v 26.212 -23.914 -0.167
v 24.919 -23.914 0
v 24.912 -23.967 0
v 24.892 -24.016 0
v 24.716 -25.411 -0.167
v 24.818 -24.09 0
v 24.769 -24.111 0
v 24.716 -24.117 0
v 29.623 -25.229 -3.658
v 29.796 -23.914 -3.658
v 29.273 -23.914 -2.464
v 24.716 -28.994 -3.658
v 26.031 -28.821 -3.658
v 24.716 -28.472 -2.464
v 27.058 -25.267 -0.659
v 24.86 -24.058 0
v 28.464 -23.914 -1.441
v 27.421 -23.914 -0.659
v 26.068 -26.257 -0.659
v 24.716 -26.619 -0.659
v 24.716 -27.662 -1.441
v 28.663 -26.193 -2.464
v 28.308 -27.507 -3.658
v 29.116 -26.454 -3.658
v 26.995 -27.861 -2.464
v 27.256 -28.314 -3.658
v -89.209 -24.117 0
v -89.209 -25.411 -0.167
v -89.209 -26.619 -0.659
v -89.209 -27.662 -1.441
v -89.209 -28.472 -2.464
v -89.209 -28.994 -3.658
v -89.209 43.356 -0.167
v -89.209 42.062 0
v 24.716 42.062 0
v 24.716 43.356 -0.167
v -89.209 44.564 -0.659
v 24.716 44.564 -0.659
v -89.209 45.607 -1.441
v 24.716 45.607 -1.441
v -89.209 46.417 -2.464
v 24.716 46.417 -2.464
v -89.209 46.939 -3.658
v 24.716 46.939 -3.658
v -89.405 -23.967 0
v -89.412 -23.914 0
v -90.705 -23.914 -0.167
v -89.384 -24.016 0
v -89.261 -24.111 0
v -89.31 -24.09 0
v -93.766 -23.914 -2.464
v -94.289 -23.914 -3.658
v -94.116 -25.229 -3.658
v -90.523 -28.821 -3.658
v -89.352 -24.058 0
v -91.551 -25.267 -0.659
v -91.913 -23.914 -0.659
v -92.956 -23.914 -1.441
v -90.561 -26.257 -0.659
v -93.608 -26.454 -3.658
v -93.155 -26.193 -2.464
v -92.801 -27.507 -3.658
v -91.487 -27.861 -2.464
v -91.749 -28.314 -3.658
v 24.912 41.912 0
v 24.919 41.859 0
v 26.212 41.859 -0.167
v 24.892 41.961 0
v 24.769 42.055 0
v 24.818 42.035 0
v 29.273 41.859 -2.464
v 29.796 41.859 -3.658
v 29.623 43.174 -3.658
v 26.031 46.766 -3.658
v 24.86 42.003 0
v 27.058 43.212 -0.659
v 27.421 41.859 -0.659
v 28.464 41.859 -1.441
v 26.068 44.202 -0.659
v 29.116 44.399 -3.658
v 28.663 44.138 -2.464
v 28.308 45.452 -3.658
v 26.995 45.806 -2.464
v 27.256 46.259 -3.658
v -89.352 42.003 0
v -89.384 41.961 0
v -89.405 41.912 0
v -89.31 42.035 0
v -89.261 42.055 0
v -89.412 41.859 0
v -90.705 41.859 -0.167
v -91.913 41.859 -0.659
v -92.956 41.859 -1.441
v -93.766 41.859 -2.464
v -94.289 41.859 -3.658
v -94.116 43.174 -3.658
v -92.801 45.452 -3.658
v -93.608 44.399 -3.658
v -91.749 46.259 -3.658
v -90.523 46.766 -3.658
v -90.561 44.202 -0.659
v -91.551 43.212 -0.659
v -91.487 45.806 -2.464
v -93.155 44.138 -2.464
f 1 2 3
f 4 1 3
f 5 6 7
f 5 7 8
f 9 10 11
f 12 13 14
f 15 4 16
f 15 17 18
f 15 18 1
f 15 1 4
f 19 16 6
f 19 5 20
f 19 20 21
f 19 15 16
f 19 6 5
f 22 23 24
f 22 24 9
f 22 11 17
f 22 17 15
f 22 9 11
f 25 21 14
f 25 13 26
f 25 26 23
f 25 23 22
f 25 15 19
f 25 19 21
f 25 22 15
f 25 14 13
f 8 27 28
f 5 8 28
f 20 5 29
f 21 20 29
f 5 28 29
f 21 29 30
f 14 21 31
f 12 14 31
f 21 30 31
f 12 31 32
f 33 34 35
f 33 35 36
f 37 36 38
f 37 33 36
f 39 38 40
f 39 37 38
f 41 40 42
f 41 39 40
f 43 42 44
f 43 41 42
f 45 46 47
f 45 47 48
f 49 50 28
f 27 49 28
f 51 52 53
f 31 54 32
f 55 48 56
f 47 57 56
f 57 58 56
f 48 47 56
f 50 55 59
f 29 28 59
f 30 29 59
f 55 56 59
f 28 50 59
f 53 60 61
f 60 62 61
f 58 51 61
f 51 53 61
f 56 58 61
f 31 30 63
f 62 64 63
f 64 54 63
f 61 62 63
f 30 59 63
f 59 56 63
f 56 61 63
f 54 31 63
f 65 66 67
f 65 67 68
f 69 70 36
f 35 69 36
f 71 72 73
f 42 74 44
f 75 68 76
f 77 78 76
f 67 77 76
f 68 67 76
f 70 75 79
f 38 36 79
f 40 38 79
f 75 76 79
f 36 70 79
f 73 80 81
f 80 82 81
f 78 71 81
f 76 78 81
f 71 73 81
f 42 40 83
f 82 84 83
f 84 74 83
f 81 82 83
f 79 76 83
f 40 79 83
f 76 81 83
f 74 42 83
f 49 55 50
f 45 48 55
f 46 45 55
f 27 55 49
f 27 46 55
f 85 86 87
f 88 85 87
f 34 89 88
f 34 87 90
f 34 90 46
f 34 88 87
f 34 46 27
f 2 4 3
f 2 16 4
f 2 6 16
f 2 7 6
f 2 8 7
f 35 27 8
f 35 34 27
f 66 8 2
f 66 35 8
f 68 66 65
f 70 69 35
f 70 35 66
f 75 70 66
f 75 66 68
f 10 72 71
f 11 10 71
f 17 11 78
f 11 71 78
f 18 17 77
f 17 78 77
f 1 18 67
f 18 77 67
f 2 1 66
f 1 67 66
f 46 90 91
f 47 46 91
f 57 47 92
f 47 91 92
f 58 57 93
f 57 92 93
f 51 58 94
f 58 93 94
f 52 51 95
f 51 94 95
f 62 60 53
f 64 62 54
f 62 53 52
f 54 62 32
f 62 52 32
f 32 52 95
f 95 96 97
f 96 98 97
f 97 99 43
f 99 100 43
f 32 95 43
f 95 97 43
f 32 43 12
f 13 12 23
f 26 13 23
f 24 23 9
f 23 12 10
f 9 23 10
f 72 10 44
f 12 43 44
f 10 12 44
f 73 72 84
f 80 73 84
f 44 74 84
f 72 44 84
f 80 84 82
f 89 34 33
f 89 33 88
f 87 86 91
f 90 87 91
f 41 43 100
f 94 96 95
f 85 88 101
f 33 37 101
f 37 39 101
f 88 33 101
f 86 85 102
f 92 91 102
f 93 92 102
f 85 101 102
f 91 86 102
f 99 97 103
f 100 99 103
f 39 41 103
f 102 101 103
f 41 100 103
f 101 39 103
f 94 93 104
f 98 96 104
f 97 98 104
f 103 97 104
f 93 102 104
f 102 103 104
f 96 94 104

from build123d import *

# Parameters (mm, degrees)
F0_W         = 124.0848004818
F0_H         = 75.9339258075
F1_DEPTH     = 3.6583524197
F2_R         = 5.08
F3_T1_DEPTH  = 113.9248004818
F3_T3_DEPTH  = 65.7739258075
F3_T6_ANGLE  = 90
F3_T8_ANGLE  = 90
F3_T10_ANGLE = 90
F3_T12_ANGLE = 90


# Not quite as in the source:
# - a fillet or chamfer that OpenCascade refuses, or shapes differently, is made with other operations: its cross-section is extruded or revolved along the edge and cut away or added


with BuildPart() as f1:
    # F0 (on Top) → F1 (new body)
    with BuildSketch(Plane.XY):
        with Locations((-32.2462767363, 8.972465992)):
            Rectangle(F0_W, F0_H)
    extrude(amount=-F1_DEPTH)

    # F2
    f2_edges = [f1.edges().sort_by_distance(p)[0] for p in [
        (29.796124, 46.939429, -1.829176),
        (29.796124, -28.994497, -1.829176),
        (-94.288677, 46.939429, -1.829176),
        (-94.288677, -28.994497, -1.829176),
    ]]
    fillet(f2_edges, radius=F2_R)

    # F3: fillet of radius 5.08 on 1 edges, made by hand

    # F3_s2 → F3_t1 (cut)
    with BuildSketch(Plane.YZ.offset(-89.2086769772)):
        with BuildLine():
            ThreePointArc((42.0624095029, 0), (45.110722995, -1.016235138), (46.9394288957, -3.6583524197))
            Line((46.9394288957, -3.6583524197), (46.9394288957, 0))
            Line((46.9394288957, 0), (42.0624095029, 0))
        make_face()
        with BuildLine():
            ThreePointArc((-24.117477519, 0), (-27.1657910111, -1.016235138), (-28.9944969118, -3.6583524197))
            Line((-28.9944969118, -3.6583524197), (-28.9944969118, 0))
            Line((-28.9944969118, 0), (-24.117477519, 0))
        make_face()
    extrude(amount=F3_T1_DEPTH, mode=Mode.SUBTRACT)

    # F3_s4 → F3_t3 (cut)
    with BuildSketch(Plane.XZ.offset(-41.8594288957)):
        with BuildLine():
            ThreePointArc((-89.4116575844, 0), (-92.4599710765, -1.016235138), (-94.2886769772, -3.6583524197))
            Line((-94.2886769772, -3.6583524197), (-94.2886769772, 0))
            Line((-94.2886769772, 0), (-89.4116575844, 0))
        make_face()
        with BuildLine():
            ThreePointArc((29.7961235046, -3.6583524197), (27.967417604, -1.016235138), (24.9191041119, 0))
            Line((24.9191041119, 0), (29.7961235046, 0))
            Line((29.7961235046, 0), (29.7961235046, -3.6583524197))
        make_face()
    extrude(amount=F3_T3_DEPTH, mode=Mode.SUBTRACT)

    # F3_s5 → F3_t6 (revolve, cut)
    with BuildSketch(Plane.YZ.offset(-89.2086769772)):
        with BuildLine():
            ThreePointArc((42.0624095029, 0), (45.110722995, -1.016235138), (46.9394288957, -3.6583524197))
            Line((46.9394288957, -3.6583524197), (46.9394288957, 0))
            Line((46.9394288957, 0), (42.0624095029, 0))
        make_face()
    revolve(axis=Axis((-89.2086769772, 41.8594288957, 0), (0, 0, 1)), revolution_arc=F3_T6_ANGLE, mode=Mode.SUBTRACT)

    # F3_s7 → F3_t8 (revolve, cut)
    with BuildSketch(Plane.XZ.offset(23.9144969118)):
        with BuildLine():
            ThreePointArc((-89.4116575844, 0), (-92.4599710765, -1.016235138), (-94.2886769772, -3.6583524197))
            Line((-94.2886769772, -3.6583524197), (-94.2886769772, 0))
            Line((-94.2886769772, 0), (-89.4116575844, 0))
        make_face()
    revolve(axis=Axis((-89.2086769772, -23.9144969118, 0), (0, 0, 1)), revolution_arc=F3_T8_ANGLE, mode=Mode.SUBTRACT)

    # F3_s9 → F3_t10 (revolve, cut)
    with BuildSketch(Plane.XZ.offset(23.9144969118)):
        with BuildLine():
            ThreePointArc((24.9191041119, 0), (27.967417604, -1.016235138), (29.7961235046, -3.6583524197))
            Line((29.7961235046, -3.6583524197), (29.7961235046, 0))
            Line((29.7961235046, 0), (24.9191041119, 0))
        make_face()
    revolve(axis=Axis((24.7161235046, -23.9144969118, 0), (0, 0, -1)), revolution_arc=F3_T10_ANGLE, mode=Mode.SUBTRACT)

    # F3_s11 → F3_t12 (revolve, cut)
    with BuildSketch(Plane.XZ.offset(-41.8594288957)):
        with BuildLine():
            ThreePointArc((24.9191041119, 0), (27.967417604, -1.016235138), (29.7961235046, -3.6583524197))
            Line((29.7961235046, -3.6583524197), (29.7961235046, 0))
            Line((29.7961235046, 0), (24.9191041119, 0))
        make_face()
    revolve(axis=Axis((24.7161235046, 41.8594288957, 0), (0, 0, 1)), revolution_arc=F3_T12_ANGLE, mode=Mode.SUBTRACT)


solid = f1.part
